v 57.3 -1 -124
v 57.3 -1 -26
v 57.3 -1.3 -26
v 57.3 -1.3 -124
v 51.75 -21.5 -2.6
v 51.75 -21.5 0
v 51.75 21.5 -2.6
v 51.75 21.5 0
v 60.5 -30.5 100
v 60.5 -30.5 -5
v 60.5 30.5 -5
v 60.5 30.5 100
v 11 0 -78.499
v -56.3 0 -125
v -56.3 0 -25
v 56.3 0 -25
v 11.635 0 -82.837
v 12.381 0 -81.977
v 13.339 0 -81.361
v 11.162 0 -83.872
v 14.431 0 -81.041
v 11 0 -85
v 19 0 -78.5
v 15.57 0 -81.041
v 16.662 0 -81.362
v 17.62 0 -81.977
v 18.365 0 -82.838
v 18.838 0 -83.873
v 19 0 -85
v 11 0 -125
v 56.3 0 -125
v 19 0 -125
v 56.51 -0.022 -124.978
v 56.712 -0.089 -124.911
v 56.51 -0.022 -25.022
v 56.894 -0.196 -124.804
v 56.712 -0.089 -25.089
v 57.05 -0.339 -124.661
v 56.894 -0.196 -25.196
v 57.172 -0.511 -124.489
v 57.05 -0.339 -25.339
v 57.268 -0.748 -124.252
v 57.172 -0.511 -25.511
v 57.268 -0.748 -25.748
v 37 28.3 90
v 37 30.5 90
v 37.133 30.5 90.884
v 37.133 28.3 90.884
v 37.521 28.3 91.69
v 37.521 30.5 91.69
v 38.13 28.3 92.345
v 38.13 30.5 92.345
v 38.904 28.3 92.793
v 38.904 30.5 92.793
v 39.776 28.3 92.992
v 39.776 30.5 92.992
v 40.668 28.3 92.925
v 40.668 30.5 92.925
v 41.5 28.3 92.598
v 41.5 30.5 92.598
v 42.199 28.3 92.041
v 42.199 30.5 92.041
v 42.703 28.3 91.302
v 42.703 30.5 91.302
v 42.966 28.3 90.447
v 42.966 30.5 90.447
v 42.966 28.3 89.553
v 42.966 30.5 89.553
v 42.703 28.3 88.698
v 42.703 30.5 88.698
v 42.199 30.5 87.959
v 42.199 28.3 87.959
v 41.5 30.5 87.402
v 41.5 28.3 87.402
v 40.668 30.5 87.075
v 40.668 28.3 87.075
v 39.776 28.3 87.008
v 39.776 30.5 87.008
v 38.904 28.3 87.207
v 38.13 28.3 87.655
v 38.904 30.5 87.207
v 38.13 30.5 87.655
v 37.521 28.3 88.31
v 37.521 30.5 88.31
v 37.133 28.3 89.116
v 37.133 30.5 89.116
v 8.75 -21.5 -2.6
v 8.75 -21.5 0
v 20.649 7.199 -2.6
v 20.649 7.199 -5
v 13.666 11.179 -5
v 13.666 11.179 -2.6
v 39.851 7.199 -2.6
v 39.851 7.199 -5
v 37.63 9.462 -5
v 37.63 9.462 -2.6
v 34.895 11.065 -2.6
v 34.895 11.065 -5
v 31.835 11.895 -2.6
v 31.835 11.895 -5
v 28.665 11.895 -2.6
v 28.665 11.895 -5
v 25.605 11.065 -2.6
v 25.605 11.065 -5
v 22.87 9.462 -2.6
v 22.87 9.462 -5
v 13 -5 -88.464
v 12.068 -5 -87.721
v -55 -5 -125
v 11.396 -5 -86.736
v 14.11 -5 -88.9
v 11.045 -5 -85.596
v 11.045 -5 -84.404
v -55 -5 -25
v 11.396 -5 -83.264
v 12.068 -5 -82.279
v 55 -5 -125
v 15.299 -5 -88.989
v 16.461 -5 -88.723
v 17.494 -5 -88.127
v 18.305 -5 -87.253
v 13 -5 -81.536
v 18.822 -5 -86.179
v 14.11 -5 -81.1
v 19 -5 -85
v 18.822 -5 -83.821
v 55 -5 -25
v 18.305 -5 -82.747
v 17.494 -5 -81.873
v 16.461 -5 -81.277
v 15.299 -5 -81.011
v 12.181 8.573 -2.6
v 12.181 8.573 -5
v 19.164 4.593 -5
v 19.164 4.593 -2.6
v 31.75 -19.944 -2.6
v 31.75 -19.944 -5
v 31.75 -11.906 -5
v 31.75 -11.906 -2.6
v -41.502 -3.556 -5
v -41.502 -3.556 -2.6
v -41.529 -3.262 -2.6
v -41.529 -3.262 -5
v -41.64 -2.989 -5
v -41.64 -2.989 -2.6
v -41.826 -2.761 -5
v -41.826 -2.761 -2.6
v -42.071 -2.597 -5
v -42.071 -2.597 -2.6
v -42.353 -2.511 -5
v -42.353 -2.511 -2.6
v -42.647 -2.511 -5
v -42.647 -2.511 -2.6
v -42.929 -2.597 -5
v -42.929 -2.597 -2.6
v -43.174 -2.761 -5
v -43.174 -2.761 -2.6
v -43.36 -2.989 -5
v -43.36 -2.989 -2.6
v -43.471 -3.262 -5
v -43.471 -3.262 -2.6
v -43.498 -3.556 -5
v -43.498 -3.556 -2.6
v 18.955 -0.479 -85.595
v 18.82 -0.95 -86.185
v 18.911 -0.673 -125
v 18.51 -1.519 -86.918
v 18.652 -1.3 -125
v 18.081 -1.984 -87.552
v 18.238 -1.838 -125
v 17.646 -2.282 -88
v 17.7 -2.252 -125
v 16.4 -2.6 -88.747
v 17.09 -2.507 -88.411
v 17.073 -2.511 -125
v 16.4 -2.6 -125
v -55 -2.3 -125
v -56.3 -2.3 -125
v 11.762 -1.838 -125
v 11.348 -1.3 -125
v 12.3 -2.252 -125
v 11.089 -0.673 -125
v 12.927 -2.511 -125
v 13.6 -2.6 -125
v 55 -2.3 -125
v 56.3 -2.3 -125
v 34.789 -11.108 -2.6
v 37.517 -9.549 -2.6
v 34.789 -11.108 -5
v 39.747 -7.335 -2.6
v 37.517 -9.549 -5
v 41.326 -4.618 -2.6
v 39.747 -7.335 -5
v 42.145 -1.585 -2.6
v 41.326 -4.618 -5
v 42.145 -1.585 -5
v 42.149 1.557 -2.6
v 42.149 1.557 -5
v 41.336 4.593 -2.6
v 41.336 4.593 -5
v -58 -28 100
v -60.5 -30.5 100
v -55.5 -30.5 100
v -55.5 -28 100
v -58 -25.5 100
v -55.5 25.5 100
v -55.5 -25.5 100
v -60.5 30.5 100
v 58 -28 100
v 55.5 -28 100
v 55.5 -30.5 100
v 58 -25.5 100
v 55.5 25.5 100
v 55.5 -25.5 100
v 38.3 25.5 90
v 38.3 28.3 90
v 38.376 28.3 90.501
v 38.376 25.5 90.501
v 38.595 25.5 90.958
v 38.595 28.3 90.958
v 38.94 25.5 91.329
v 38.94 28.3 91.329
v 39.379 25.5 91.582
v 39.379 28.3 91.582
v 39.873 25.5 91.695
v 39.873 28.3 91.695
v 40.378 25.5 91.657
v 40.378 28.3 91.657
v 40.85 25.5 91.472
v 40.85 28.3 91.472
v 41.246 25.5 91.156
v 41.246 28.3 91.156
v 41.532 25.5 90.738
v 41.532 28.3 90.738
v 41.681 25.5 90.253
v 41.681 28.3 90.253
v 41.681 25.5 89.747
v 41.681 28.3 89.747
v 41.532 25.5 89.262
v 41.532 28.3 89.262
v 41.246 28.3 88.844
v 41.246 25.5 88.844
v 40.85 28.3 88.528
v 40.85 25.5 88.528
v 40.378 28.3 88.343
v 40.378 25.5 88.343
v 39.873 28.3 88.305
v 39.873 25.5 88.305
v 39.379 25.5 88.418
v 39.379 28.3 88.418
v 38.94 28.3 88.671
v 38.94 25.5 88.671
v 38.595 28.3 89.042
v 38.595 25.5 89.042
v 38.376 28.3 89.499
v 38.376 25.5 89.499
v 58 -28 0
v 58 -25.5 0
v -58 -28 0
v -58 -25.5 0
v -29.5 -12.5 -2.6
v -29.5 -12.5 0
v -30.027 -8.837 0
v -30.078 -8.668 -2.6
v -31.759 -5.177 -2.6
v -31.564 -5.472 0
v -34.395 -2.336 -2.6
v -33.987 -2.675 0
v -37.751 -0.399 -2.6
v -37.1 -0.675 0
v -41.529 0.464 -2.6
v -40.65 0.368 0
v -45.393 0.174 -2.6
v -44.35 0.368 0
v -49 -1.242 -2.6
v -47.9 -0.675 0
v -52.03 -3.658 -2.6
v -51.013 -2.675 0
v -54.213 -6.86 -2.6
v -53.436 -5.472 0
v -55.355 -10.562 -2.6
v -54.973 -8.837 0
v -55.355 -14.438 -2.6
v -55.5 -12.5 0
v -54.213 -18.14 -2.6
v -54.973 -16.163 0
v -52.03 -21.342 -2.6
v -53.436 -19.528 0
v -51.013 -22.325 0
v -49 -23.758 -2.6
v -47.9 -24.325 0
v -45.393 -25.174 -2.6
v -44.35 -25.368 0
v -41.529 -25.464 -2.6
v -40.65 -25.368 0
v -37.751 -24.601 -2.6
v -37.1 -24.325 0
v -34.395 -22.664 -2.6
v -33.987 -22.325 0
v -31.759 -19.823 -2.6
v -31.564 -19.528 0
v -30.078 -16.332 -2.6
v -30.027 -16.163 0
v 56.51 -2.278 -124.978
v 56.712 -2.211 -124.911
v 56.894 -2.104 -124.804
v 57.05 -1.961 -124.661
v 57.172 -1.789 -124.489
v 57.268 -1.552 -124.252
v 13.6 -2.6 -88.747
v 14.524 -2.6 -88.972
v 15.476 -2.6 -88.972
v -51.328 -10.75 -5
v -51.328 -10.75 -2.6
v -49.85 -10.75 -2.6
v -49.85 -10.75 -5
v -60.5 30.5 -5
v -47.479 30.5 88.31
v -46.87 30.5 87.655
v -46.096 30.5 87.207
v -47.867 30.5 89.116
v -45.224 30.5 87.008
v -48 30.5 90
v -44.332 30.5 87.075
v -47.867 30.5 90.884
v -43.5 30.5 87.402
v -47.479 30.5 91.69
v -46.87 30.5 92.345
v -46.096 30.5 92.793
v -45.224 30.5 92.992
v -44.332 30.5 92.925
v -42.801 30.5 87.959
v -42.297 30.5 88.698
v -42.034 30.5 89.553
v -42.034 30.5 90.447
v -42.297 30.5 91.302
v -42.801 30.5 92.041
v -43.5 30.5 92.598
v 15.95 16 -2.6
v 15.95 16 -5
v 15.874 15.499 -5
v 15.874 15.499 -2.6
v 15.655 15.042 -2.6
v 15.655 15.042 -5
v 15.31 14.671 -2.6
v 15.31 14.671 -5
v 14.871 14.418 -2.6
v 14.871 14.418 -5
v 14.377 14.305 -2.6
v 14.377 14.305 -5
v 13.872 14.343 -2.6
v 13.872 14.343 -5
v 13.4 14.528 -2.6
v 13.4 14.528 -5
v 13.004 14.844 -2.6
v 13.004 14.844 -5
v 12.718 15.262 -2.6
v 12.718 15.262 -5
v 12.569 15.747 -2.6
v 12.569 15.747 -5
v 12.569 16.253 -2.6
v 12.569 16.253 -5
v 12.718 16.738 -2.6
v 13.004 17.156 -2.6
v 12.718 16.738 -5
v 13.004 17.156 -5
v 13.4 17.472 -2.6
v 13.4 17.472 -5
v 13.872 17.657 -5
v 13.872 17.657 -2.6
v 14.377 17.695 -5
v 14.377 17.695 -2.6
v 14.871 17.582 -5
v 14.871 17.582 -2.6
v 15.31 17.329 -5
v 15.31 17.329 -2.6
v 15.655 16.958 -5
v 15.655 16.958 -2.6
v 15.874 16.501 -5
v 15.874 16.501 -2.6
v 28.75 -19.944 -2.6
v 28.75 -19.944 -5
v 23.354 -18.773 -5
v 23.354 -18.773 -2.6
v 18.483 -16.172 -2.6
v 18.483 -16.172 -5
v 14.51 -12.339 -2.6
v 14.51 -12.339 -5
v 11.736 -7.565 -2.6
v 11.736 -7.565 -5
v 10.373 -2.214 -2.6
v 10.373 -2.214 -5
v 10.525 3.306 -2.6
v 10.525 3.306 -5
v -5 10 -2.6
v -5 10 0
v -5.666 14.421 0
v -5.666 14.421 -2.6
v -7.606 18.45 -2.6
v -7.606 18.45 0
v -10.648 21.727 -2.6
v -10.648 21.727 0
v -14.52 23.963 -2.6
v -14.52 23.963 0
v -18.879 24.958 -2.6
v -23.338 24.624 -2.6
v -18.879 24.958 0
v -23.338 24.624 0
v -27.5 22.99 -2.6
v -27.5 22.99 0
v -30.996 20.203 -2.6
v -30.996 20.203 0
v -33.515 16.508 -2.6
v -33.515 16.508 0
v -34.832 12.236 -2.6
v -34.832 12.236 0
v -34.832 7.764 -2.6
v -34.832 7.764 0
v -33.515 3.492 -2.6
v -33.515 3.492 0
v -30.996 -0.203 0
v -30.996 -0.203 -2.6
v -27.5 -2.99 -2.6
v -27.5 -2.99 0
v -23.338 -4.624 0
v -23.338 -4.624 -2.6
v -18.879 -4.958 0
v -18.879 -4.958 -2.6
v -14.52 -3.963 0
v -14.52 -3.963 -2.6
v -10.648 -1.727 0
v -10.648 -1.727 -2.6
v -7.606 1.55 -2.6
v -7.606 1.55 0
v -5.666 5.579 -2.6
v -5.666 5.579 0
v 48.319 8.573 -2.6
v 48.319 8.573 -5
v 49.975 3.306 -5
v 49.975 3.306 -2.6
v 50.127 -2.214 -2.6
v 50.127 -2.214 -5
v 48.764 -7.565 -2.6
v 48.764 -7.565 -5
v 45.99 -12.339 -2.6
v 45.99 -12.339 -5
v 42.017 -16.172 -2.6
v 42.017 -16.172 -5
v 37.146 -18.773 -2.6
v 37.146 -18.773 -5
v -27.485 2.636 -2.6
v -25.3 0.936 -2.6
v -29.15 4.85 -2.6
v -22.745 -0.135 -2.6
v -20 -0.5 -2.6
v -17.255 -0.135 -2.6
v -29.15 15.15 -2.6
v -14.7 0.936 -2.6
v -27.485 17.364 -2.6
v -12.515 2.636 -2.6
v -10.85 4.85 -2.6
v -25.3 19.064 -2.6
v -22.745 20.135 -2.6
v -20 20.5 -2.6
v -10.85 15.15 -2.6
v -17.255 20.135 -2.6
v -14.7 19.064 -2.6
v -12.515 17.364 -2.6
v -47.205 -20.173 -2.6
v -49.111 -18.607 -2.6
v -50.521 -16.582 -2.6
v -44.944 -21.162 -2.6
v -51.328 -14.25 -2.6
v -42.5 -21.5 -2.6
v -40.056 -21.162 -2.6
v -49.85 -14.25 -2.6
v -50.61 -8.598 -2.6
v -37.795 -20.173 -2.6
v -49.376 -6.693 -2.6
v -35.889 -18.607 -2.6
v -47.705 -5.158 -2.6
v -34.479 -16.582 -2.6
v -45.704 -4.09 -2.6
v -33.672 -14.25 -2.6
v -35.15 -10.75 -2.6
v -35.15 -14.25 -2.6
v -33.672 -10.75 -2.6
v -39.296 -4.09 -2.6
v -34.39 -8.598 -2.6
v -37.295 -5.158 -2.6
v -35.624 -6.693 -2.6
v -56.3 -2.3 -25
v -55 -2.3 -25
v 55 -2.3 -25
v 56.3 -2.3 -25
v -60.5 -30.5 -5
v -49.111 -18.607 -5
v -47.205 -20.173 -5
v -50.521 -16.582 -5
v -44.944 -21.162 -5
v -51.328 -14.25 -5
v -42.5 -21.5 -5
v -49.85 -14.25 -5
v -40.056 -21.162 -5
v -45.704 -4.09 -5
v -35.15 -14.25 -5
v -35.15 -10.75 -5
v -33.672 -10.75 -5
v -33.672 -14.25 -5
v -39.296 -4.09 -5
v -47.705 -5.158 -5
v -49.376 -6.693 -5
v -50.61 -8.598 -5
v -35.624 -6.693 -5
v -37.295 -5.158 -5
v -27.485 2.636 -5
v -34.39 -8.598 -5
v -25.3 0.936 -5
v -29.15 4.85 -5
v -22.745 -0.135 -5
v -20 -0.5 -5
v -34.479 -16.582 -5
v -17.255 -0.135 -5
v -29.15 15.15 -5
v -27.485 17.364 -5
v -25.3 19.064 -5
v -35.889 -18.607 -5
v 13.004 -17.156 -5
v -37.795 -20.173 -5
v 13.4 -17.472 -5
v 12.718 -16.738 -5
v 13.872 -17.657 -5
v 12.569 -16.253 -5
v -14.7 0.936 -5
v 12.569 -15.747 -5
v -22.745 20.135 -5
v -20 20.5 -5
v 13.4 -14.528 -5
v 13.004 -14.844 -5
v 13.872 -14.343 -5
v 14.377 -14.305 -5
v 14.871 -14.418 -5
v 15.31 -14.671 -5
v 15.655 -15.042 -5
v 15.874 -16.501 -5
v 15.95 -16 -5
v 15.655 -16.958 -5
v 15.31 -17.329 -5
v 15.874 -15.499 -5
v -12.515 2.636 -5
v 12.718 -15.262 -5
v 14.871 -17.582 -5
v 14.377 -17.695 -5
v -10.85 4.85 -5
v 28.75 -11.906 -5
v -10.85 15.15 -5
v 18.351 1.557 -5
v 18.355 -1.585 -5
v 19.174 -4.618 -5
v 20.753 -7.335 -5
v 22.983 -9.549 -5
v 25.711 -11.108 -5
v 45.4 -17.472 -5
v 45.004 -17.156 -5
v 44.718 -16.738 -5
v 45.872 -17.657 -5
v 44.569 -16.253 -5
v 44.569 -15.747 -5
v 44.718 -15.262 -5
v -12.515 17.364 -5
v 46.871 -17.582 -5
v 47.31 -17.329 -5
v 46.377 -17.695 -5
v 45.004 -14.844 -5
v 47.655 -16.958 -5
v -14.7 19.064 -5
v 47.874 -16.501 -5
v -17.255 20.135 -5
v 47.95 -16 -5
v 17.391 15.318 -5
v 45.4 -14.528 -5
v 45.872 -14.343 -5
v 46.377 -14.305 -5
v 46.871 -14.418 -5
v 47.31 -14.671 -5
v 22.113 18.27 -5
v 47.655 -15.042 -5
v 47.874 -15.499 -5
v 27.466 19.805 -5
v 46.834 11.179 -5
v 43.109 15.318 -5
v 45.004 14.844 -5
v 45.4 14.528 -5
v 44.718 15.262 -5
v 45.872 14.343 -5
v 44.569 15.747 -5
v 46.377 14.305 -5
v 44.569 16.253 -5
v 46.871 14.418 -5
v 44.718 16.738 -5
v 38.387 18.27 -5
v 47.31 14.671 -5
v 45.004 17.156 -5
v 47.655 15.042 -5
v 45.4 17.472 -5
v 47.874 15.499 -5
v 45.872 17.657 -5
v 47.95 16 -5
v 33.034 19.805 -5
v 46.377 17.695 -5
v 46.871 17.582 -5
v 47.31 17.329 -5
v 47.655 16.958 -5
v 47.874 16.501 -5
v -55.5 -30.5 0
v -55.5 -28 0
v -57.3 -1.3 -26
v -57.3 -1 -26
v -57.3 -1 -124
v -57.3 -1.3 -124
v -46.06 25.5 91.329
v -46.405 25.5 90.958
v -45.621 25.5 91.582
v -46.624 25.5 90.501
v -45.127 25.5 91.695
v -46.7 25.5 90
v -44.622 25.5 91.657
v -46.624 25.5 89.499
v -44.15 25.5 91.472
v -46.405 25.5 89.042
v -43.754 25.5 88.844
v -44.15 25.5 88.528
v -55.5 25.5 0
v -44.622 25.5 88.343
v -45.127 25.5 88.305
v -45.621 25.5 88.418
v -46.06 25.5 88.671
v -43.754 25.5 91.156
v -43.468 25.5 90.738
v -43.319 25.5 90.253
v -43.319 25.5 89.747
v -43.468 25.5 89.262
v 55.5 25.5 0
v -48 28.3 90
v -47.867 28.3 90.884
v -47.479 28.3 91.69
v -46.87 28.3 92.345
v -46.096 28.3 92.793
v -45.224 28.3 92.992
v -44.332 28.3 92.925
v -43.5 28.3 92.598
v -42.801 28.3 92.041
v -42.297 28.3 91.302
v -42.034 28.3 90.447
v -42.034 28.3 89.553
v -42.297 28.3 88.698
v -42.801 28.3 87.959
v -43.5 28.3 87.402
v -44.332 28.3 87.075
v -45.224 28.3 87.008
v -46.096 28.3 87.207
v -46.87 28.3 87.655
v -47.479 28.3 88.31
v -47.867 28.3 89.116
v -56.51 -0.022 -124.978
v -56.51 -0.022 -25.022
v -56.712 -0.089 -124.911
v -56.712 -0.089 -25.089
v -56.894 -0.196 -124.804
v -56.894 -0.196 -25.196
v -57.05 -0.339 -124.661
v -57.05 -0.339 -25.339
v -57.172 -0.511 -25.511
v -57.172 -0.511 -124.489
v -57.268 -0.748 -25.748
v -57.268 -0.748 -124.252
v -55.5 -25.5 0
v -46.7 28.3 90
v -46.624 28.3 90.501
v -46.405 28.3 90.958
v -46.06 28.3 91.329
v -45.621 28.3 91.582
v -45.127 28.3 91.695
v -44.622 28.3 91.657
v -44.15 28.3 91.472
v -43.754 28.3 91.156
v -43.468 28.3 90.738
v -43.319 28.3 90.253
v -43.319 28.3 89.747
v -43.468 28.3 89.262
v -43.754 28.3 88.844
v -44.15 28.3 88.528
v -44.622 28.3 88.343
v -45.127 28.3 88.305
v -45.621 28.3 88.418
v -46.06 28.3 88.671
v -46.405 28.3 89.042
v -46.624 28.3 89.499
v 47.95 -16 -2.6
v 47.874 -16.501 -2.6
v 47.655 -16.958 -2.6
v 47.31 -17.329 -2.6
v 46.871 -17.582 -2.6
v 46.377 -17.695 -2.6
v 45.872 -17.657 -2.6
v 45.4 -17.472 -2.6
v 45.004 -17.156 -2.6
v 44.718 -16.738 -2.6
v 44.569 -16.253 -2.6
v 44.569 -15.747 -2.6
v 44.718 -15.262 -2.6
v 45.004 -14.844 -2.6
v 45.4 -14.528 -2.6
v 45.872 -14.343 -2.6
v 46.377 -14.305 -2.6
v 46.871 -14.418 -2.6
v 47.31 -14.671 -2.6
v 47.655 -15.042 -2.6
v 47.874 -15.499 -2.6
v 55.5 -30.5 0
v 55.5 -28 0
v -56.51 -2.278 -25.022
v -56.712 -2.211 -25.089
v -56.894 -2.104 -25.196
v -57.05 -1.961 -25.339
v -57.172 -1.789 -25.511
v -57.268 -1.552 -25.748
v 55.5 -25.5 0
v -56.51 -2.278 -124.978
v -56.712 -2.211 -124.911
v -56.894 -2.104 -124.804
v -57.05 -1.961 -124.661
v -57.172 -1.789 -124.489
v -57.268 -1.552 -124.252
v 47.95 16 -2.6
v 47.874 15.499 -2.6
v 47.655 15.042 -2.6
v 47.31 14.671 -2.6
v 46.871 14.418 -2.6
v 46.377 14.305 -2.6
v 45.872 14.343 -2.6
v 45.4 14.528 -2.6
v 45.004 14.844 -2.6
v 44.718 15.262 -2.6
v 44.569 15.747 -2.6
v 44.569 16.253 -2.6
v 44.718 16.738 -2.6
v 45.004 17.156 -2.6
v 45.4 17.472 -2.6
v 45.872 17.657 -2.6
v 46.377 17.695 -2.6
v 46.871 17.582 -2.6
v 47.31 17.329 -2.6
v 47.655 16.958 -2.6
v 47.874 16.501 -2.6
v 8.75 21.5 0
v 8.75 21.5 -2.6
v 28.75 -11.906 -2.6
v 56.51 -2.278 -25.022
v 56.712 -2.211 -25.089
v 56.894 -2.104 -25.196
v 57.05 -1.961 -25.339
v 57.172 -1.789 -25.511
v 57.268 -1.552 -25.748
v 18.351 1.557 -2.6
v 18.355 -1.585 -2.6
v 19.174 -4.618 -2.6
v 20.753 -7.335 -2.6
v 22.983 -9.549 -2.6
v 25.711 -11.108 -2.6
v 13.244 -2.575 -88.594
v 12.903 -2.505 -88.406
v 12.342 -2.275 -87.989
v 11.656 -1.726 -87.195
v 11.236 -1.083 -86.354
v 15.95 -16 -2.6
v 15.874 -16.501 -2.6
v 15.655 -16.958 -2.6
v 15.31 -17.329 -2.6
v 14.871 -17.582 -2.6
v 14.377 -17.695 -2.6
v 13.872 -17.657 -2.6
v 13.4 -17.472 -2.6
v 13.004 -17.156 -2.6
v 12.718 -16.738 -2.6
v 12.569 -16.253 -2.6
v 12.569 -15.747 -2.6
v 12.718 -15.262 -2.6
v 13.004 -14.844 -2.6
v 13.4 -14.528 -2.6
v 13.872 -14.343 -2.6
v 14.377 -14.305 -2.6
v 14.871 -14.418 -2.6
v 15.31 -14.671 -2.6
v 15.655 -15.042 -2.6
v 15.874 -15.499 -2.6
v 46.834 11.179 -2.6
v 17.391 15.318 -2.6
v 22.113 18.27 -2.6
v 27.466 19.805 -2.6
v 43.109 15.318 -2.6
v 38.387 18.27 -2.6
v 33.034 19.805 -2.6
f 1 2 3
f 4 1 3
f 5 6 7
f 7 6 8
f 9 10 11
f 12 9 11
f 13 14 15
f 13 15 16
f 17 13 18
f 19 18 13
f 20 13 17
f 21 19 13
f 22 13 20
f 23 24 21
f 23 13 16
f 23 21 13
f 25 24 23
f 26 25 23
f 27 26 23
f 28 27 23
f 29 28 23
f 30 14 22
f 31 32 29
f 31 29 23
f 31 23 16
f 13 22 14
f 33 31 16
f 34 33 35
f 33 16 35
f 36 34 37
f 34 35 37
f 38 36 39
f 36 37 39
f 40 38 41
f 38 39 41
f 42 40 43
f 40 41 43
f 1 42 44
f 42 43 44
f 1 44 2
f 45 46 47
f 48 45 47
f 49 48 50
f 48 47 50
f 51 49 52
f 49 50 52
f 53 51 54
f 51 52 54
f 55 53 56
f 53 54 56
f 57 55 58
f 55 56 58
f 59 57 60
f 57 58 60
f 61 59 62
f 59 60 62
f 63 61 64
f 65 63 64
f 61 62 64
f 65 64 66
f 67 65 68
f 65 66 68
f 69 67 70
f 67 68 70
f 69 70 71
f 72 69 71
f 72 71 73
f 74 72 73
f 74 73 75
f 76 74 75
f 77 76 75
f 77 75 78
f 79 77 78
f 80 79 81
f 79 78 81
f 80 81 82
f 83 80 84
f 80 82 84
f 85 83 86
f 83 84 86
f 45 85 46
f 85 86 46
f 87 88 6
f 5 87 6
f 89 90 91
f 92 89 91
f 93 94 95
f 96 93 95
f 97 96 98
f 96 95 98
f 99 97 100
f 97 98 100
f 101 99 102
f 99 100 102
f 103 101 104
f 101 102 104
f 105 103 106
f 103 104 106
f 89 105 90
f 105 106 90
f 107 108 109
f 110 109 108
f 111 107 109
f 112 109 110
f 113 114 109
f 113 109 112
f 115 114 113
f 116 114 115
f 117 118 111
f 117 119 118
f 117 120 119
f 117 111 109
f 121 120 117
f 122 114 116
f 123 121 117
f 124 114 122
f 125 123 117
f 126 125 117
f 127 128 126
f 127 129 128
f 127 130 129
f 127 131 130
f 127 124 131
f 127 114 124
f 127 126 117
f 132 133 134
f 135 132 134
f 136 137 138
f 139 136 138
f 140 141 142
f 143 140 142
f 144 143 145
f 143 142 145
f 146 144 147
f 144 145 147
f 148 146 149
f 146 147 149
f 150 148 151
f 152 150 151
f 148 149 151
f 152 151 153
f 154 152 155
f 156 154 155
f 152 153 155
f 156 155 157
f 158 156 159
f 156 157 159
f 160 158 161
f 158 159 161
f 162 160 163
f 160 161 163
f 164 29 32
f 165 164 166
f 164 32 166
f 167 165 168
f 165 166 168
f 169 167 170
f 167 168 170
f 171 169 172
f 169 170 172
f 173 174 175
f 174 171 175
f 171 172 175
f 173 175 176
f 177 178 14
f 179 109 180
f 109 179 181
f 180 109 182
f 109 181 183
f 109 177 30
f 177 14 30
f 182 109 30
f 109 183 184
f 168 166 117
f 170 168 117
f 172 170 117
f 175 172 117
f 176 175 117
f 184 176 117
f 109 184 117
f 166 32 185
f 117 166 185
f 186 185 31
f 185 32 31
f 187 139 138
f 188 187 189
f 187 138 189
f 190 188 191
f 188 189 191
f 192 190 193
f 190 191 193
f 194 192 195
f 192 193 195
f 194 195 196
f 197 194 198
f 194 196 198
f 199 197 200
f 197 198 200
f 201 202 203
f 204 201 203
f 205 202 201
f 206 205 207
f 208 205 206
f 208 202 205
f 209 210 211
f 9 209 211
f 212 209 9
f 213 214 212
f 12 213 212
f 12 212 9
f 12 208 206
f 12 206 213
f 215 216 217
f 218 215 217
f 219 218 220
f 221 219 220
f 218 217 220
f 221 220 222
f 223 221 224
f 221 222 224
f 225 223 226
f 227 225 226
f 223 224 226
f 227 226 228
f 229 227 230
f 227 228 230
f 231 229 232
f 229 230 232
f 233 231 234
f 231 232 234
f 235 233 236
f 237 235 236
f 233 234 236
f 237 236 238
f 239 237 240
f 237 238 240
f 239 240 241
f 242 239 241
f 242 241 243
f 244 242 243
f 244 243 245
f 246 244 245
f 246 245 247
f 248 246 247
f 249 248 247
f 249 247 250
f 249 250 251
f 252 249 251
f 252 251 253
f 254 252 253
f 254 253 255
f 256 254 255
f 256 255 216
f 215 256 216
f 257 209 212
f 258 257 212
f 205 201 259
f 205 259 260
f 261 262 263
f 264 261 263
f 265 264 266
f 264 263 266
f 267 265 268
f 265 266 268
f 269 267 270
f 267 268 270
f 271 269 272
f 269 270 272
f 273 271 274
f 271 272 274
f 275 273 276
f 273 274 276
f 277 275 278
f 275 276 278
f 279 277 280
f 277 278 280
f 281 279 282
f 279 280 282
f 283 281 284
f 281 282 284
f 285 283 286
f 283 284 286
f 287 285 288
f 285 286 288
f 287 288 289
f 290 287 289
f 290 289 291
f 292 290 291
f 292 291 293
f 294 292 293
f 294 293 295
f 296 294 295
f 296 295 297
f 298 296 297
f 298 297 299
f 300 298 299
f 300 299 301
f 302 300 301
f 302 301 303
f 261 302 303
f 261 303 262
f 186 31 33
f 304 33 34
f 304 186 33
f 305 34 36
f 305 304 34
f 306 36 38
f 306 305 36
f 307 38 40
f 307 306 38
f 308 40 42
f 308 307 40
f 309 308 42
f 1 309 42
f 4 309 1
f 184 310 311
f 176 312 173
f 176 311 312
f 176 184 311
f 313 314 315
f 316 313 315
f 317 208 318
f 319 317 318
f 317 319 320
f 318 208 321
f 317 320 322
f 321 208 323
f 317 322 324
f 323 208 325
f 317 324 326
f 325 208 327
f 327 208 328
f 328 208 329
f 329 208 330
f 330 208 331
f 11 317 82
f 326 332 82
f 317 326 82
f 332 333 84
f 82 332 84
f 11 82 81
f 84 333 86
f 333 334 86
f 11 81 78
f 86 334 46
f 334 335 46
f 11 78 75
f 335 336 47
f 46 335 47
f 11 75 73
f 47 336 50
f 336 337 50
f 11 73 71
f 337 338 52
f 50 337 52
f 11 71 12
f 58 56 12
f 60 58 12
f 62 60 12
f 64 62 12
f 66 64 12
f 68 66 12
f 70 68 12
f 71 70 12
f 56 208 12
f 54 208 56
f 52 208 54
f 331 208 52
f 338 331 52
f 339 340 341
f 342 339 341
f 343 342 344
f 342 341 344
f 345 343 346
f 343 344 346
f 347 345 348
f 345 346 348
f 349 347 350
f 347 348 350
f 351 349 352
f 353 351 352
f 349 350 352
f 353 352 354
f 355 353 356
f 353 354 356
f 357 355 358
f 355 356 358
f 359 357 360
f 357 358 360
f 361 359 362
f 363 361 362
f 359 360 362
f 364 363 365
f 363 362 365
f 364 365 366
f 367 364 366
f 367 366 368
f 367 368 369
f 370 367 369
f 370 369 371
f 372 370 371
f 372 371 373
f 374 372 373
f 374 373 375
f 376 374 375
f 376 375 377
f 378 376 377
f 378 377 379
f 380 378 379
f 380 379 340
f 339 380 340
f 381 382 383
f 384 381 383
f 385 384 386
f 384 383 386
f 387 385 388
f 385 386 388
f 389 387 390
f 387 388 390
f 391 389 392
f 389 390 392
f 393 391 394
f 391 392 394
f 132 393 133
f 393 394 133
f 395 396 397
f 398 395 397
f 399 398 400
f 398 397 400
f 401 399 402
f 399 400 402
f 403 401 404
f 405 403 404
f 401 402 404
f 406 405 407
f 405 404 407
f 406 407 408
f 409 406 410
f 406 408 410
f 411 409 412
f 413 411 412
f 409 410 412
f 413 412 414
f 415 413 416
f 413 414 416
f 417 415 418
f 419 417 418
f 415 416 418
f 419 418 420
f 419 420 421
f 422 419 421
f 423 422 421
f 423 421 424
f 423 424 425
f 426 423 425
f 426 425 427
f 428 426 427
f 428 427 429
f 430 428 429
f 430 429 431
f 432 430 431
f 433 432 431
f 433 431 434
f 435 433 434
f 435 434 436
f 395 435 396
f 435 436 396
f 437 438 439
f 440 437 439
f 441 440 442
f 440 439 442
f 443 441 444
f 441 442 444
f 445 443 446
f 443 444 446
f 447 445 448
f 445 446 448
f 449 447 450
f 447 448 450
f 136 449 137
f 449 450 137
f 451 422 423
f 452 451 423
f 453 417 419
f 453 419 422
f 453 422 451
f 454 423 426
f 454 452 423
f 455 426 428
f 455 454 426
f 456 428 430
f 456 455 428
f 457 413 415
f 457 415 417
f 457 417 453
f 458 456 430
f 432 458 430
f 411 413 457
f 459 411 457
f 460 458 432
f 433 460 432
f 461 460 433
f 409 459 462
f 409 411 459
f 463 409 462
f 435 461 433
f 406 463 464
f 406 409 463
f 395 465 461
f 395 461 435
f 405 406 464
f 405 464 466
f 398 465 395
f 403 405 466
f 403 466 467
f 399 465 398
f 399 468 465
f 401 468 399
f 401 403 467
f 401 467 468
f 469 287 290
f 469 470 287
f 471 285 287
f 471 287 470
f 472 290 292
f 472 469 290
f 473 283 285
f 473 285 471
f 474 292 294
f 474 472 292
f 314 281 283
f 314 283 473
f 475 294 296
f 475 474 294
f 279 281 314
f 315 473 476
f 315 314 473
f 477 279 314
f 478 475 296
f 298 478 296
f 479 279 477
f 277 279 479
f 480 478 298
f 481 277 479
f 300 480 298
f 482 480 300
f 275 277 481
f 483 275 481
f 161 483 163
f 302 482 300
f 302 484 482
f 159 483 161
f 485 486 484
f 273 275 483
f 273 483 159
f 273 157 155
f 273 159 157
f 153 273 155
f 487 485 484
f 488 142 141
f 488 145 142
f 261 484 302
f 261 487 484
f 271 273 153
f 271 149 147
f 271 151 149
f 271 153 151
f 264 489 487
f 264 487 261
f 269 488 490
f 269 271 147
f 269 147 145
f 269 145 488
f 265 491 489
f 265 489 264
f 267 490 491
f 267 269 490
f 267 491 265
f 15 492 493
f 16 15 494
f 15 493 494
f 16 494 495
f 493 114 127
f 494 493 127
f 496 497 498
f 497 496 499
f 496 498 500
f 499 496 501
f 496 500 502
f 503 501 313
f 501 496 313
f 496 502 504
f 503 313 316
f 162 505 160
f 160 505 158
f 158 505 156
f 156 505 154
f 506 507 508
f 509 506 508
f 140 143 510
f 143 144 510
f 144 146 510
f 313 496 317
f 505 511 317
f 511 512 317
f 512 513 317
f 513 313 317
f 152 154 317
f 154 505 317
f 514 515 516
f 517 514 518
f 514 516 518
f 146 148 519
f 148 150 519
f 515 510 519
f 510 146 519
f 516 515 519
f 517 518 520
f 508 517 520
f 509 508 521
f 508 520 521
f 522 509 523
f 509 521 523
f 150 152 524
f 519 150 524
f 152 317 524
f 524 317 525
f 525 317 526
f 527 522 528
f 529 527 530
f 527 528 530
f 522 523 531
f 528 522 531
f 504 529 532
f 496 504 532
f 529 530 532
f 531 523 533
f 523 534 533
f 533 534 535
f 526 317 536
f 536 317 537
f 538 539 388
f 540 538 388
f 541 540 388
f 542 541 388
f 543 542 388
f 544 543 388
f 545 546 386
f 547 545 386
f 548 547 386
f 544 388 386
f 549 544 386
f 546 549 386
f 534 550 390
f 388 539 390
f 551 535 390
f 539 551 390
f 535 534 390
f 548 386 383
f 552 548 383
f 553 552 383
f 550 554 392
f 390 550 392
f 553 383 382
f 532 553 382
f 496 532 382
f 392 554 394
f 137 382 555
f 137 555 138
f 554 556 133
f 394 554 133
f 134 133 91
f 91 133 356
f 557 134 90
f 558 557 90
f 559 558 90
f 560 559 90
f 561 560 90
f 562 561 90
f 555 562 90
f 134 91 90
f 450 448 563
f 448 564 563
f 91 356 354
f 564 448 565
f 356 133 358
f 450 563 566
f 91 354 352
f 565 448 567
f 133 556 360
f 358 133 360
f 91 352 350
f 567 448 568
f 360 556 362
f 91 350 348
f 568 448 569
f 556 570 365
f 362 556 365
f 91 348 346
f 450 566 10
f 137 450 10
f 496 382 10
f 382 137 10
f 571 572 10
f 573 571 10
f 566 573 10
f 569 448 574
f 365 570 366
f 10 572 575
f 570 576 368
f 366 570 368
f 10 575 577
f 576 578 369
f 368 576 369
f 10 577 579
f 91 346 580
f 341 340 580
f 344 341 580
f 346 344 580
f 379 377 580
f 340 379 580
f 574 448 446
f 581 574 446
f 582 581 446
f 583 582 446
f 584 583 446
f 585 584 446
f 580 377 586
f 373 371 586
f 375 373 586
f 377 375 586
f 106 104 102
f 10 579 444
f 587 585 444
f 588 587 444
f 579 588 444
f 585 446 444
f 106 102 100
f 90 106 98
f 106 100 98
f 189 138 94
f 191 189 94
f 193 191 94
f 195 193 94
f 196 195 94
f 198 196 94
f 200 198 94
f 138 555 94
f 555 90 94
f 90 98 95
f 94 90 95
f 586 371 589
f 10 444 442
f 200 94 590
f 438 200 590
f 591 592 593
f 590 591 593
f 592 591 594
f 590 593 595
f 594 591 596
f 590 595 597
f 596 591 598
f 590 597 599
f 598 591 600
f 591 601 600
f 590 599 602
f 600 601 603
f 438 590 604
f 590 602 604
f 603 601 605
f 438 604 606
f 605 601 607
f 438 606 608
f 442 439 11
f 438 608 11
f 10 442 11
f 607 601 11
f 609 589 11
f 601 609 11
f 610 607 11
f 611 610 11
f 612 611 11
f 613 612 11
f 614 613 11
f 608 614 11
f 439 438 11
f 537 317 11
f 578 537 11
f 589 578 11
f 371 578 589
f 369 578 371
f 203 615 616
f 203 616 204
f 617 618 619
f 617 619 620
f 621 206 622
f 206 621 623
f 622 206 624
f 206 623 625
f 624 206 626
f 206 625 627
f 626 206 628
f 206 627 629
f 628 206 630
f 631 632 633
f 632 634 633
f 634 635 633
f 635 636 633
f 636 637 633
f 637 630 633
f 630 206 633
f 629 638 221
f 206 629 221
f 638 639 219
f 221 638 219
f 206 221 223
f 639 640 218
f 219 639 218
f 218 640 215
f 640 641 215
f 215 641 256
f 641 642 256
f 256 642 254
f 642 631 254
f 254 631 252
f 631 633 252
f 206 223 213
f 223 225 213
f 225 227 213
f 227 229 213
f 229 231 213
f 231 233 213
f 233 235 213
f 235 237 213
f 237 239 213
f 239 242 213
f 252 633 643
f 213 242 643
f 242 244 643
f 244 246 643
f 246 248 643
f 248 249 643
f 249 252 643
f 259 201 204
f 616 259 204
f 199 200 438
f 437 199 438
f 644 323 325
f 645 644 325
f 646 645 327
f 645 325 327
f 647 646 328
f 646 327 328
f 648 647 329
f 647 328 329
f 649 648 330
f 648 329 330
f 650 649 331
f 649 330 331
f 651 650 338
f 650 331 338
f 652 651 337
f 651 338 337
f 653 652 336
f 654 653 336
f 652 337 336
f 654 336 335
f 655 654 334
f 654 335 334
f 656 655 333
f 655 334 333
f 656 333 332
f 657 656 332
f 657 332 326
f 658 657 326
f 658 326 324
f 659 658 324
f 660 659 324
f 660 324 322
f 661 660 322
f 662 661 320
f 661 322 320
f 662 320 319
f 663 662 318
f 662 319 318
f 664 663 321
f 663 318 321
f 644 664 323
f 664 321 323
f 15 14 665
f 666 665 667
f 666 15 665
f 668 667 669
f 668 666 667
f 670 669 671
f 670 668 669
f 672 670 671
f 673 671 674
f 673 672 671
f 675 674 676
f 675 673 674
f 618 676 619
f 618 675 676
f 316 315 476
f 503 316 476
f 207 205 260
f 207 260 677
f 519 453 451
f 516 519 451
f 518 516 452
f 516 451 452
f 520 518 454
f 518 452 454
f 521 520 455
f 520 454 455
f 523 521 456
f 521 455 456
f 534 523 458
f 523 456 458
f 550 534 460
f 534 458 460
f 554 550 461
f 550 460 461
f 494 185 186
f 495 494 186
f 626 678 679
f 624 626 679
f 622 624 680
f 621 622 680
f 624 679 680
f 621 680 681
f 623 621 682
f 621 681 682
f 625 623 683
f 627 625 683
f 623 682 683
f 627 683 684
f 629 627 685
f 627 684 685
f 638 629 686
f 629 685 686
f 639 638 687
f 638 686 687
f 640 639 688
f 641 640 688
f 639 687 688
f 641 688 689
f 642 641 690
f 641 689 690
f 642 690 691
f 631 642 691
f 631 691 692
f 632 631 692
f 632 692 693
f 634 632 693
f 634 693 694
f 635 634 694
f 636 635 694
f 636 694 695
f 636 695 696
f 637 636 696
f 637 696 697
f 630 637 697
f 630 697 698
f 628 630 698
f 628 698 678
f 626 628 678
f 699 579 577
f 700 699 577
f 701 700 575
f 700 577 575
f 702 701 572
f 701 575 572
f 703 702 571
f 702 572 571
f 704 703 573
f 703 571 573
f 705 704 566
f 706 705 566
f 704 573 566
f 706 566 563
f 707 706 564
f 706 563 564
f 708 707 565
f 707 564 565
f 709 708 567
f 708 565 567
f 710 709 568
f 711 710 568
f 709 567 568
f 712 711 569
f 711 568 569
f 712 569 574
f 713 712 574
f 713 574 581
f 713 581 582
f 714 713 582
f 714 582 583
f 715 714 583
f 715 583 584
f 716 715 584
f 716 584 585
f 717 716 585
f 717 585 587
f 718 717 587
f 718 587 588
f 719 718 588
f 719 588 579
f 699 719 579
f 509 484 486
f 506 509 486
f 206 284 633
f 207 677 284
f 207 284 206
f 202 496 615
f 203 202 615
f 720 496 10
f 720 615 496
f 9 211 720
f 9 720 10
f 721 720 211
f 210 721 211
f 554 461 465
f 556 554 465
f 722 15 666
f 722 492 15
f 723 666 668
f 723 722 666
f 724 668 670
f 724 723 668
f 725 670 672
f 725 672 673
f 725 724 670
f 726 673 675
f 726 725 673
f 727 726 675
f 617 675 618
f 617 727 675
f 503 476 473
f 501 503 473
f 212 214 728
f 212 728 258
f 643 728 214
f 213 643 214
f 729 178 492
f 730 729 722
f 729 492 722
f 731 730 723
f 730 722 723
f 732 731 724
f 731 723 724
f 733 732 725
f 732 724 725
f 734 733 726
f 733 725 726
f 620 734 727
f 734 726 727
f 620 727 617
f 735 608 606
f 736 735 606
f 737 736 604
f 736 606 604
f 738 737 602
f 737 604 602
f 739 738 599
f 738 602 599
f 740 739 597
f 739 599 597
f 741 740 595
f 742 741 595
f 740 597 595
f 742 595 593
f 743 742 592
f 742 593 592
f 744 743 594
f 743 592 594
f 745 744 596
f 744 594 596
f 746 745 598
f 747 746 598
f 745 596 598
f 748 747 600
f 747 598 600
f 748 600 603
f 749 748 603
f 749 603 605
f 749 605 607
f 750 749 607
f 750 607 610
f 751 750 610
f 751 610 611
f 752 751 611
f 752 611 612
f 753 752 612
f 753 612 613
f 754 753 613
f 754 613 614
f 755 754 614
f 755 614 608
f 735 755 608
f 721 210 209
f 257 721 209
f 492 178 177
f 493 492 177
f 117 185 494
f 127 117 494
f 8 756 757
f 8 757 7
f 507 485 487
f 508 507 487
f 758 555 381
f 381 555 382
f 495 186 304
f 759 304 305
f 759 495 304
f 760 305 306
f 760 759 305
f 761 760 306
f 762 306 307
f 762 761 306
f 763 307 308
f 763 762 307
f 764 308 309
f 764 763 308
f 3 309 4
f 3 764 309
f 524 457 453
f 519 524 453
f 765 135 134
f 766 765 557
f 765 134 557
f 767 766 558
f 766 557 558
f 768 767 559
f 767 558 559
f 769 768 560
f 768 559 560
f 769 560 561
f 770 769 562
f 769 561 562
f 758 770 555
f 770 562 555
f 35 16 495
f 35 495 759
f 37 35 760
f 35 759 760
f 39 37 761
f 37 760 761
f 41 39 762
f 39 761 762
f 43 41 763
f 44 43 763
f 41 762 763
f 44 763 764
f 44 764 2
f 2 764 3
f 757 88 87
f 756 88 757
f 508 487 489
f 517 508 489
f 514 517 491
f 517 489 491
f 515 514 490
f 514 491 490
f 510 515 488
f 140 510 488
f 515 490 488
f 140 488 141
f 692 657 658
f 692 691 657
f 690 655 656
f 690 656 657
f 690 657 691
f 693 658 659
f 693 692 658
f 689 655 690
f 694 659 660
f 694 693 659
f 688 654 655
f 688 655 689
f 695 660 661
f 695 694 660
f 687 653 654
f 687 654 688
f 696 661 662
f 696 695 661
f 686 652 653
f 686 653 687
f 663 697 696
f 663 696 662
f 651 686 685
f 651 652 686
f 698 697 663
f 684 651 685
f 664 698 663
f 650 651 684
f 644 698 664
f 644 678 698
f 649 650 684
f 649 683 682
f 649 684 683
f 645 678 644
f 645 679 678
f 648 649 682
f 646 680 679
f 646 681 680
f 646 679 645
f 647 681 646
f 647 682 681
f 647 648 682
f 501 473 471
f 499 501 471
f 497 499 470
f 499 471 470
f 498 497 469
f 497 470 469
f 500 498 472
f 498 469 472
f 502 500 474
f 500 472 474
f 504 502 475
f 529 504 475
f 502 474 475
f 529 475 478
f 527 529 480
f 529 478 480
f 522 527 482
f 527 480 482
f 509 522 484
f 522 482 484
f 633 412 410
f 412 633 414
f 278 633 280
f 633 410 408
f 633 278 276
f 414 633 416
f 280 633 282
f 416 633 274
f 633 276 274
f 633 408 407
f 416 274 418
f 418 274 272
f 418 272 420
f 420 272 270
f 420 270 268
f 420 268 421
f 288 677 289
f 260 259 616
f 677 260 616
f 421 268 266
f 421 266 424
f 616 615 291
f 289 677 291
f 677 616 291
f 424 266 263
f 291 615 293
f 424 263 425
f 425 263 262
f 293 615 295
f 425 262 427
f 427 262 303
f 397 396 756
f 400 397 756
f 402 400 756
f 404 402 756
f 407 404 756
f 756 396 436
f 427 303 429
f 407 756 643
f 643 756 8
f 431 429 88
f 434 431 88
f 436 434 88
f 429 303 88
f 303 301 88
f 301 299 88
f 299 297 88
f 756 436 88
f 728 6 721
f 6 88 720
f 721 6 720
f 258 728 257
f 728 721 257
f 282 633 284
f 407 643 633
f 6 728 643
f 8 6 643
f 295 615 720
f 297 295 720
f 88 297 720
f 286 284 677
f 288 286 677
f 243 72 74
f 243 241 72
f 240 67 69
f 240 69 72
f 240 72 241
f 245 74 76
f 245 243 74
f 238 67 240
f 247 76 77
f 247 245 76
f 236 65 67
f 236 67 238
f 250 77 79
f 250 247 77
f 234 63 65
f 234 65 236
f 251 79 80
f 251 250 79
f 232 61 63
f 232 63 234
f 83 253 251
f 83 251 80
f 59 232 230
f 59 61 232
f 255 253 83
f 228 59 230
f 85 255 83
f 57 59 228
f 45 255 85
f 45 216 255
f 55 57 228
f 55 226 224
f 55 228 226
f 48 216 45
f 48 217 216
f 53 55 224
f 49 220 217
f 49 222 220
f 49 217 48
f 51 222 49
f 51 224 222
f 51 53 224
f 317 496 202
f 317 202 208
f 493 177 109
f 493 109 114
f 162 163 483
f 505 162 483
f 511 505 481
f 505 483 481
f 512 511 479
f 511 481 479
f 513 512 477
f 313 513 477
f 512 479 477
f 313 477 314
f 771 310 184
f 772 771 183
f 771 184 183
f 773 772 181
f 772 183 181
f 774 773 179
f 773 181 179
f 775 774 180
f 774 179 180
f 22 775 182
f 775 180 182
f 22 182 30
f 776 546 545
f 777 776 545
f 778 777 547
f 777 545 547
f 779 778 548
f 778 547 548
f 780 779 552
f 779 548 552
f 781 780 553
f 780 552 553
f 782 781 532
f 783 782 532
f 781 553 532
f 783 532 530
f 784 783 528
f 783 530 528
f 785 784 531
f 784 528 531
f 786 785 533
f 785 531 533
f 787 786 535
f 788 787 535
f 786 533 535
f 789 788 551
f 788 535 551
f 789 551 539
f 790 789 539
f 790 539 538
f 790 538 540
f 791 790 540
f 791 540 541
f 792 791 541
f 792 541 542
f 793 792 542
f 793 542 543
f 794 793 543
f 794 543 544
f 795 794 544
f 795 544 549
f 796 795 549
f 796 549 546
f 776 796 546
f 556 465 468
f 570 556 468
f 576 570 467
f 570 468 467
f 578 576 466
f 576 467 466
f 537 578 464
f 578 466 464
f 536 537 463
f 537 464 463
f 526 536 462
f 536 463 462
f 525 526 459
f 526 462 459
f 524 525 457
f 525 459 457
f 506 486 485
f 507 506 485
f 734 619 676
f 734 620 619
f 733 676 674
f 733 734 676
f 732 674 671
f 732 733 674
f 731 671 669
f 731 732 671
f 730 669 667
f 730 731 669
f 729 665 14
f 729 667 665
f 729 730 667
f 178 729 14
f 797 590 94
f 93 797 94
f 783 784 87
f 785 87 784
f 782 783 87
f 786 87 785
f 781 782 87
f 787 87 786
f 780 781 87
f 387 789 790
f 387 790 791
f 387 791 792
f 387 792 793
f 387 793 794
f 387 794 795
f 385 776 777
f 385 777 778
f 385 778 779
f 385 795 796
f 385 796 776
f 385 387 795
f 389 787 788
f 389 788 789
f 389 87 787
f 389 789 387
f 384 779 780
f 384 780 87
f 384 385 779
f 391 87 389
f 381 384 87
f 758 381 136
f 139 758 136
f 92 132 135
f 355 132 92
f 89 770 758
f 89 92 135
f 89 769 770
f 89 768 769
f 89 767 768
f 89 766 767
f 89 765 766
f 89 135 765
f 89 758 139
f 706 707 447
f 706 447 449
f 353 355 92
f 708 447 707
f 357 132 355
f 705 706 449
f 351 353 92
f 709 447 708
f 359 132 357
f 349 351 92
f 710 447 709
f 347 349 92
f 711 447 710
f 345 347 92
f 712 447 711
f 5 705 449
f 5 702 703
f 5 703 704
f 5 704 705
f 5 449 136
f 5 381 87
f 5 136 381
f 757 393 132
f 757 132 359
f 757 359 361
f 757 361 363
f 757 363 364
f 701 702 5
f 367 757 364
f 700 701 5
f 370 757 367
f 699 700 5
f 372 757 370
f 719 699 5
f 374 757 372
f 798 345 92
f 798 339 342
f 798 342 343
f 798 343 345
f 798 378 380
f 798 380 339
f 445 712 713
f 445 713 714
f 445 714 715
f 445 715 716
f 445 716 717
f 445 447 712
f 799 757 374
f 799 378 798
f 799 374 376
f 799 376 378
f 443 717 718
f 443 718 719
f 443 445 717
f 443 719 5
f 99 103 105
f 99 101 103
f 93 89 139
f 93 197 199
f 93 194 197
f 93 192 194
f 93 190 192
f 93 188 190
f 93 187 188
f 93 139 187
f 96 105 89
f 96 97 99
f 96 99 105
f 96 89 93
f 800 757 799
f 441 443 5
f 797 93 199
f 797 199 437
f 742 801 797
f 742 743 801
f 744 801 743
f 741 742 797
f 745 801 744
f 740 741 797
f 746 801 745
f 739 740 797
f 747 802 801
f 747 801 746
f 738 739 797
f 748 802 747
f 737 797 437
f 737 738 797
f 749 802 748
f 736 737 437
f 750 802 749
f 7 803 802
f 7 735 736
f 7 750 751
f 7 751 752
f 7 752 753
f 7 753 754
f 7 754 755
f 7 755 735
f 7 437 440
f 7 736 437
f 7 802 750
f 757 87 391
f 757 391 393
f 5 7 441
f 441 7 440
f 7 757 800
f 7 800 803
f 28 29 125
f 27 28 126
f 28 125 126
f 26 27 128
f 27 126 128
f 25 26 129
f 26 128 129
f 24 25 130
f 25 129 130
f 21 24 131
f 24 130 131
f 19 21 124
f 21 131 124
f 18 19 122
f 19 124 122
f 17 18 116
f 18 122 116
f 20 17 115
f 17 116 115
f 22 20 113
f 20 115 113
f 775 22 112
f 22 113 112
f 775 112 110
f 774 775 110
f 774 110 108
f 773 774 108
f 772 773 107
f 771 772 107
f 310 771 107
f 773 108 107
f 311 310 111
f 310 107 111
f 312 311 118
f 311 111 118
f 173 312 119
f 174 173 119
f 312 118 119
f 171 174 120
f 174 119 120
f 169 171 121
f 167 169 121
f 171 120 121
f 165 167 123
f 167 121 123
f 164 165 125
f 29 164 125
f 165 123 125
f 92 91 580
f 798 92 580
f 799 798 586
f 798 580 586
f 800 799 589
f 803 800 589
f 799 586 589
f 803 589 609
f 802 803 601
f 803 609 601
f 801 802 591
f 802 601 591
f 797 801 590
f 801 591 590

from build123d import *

# Parameters (mm, degrees)
F0_W          = 121
F0_H          = 61
F0_W_2        = 111
F0_H_2        = 51
F1_DEPTH      = 100
F2_W          = 121
F2_H          = 61
F3_DEPTH      = 5
F5_DEPTH      = 25
F7_R          = 1.7
F8_DEPTH      = 25
F10_R         = 1.7
F11_DEPTH     = 25
F12_R         = 3
F13_DEPTH     = 2.2
F14_R         = 15
F14_R_2       = 13
F14_W         = 43
F14_H         = 43
F15_DEPTH     = 2.6
F17_W         = 111
F17_H         = 100
F18_DEPTH     = 25
F20_W         = 2.5
F20_H         = 2.5
F21_DEPTH     = 100
F22_W         = 110
F22_H         = 100
F22_R         = 4
F23_DEPTH     = 5
F24_W         = 2.3
F24_H         = 2.3
F25_DEPTH     = 100
F26_R         = 1
F28_W         = 8
F28_H         = 2.6
F29_DEPTH     = 40.001
F30_T4_DEPTH  = 46.5
F30_S5_R      = 4
F30_T6_DEPTH  = 25
F30_T10_DEPTH = 46.501
F30_S11_R     = 4
F30_T12_DEPTH = 25


# Not quite as in the source:
# - a fillet or chamfer that OpenCascade refuses, or shapes differently, is made with other operations: its cross-section is extruded or revolved along the edge and cut away or added


with BuildPart() as f1:
    # F0 (on Top) → F1 (new body)
    with BuildSketch(Plane.XY):
        Rectangle(F0_W, F0_H)
        Rectangle(F0_W_2, F0_H_2, mode=Mode.SUBTRACT)
    extrude(amount=F1_DEPTH)

    # F2 (on Top) → F3 (join)
    with BuildSketch(Plane.XY):
        Rectangle(F2_W, F2_H)
    extrude(amount=-F3_DEPTH)

    # F4 (on Top) → F5 (cut)
    with BuildSketch(Plane.XY):
        with BuildLine():
            Line((-35.15, -10.75), (-33.6717782085, -10.75))
            ThreePointArc((-33.6717782085, -10.75), (-36.410590764, -5.8728516572), (-41.5015444025, -3.5555555556))
            ThreePointArc((-41.5015444025, -3.5555555556), (-42.5, -2.5), (-43.4984555975, -3.5555555556))
            ThreePointArc((-43.4984555975, -3.5555555556), (-48.589409236, -5.8728516572), (-51.3282217915, -10.75))
            Line((-51.3282217915, -10.75), (-49.85, -10.75))
            Line((-49.85, -10.75), (-49.85, -14.25))
            Line((-49.85, -14.25), (-51.3282217915, -14.25))
            ThreePointArc((-51.3282217915, -14.25), (-42.5, -21.5), (-33.6717782085, -14.25))
            Line((-33.6717782085, -14.25), (-35.15, -14.25))
            Line((-35.15, -14.25), (-35.15, -10.75))
        make_face()
        with BuildLine():
            Line((-29.15, 15.150485414), (-29.15, 4.849514586))
            ThreePointArc((-29.15, 4.849514586), (-20, -0.5), (-10.85, 4.849514586))
            Line((-10.85, 4.849514586), (-10.85, 15.150485414))
            ThreePointArc((-10.85, 15.150485414), (-20, 20.5), (-29.15, 15.150485414))
        make_face()
    extrude(amount=-F5_DEPTH, mode=Mode.SUBTRACT)

    # F7 (on offset) → F8 (cut)
    with BuildSketch(Plane(origin=(0, 30.5, 0), x_dir=(-1, 0, 0), z_dir=(0, 1, 0))):
        with Locations((-40, 90)):
            Circle(F7_R)
        with Locations((45, 90)):
            Circle(F7_R)
    extrude(amount=-F8_DEPTH, mode=Mode.SUBTRACT)

    # F10 (on offset) → F11 (cut)
    with BuildSketch(Plane(origin=(0, 0, -5), x_dir=(1, 0, 0), z_dir=(0, 0, -1))):
        with Locations((14.25, 16)):
            Circle(F10_R)
        with BuildLine():
            Line((28.75, 11.9058808998), (28.75, 19.9436706752))
            ThreePointArc((28.75, 19.9436706752), (12.9572093402, 10.0478550546), (12.1805876672, -8.5730005218))
            Line((12.1805876672, -8.5730005218), (19.1636367266, -4.5926625579))
            ThreePointArc((19.1636367266, -4.5926625579), (19.8743256041, 6.0287130328), (28.75, 11.9058808998))
        make_face()
        with BuildLine():
            Line((31.75, 19.9436706752), (31.75, 11.9058808998))
            ThreePointArc((31.75, 11.9058808998), (40.6256743959, 6.0287130328), (41.3363632734, -4.5926625579))
            Line((41.3363632734, -4.5926625579), (48.3194123328, -8.5730005218))
            ThreePointArc((48.3194123328, -8.5730005218), (47.5427906598, 10.0478550546), (31.75, 19.9436706752))
        make_face()
        with Locations((46.25, 16)):
            Circle(F10_R)
        with BuildLine():
            Line((46.8338032008, -11.1793323324), (39.8507541413, -7.1989943685))
            ThreePointArc((39.8507541413, -7.1989943685), (30.25, -12), (20.6492458587, -7.1989943685))
            Line((20.6492458587, -7.1989943685), (13.6661967992, -11.1793323324))
            ThreePointArc((13.6661967992, -11.1793323324), (30.25, -20), (46.8338032008, -11.1793323324))
        make_face()
        with Locations((14.25, -16)):
            Circle(F10_R)
        with Locations((46.25, -16)):
            Circle(F10_R)
    extrude(amount=-F11_DEPTH, mode=Mode.SUBTRACT)

    # F12 (on offset) → F13 (cut)
    with BuildSketch(Plane(origin=(0, 30.5, 0), x_dir=(-1, 0, 0), z_dir=(0, 1, 0))):
        with Locations((-40, 90)):
            Circle(F12_R)
        with Locations((45, 90)):
            Circle(F12_R)
    extrude(amount=-F13_DEPTH, mode=Mode.SUBTRACT)

    # F14 (on Top) → F15 (cut)
    with BuildSketch(Plane.XY):
        with Locations((-20, 10)):
            Circle(F14_R)
        with Locations((-42.5, -12.5)):
            Circle(F14_R_2)
        with Locations((30.25, 0)):
            Rectangle(F14_W, F14_H)
    extrude(amount=-F15_DEPTH, mode=Mode.SUBTRACT)

    # F17 (on offset) → F18 (cut)
    with BuildSketch(Plane.XZ.offset(30.5)):
        with Locations((0, 50)):
            Rectangle(F17_W, F17_H)
    extrude(amount=-F18_DEPTH, mode=Mode.SUBTRACT)

    # F20 (on offset) → F21 (cut)
    with BuildSketch(Plane.XY.offset(100)):
        with Locations((-56.75, -26.75)):
            Rectangle(F20_W, F20_H)
        with Locations((56.75, -26.75)):
            Rectangle(F20_W, F20_H)
    extrude(amount=-F21_DEPTH, mode=Mode.SUBTRACT)


with BuildPart() as f23:
    # F22 (on Front) → F23 (new body)
    with BuildSketch(Plane.XZ):
        with Locations((0, -75)):
            Rectangle(F22_W, F22_H)
        with Locations((15, -85)):
            Circle(F22_R, mode=Mode.SUBTRACT)
    extrude(amount=F23_DEPTH)

    # F24 (on face) → F25 (join)
    with BuildSketch(Plane(origin=(0, 0, -125), x_dir=(1, 0, 0), z_dir=(0, 0, -1))):
        with Locations((56.15, 1.15)):
            Rectangle(F24_W, F24_H)
        with Locations((-56.15, 1.15)):
            Rectangle(F24_W, F24_H)
    extrude(amount=-F25_DEPTH)

    # F26
    f26_edges = [f23.edges().sort_by_distance(p)[0] for p in [
        (57.3, 0, -75),
        (57.3, -2.3, -75),
        (57.3, -1.15, -125),
        (57.3, -1.15, -25),
        (-57.3, -2.3, -75),
        (-57.3, 0, -75),
        (-57.3, -1.15, -125),
        (-57.3, -1.15, -25),
    ]]
    fillet(f26_edges, radius=F26_R)

    # F28 (on offset) → F29 (cut, through all)
    with BuildSketch(Plane(origin=(0, 0, -125), x_dir=(1, 0, 0), z_dir=(0, 0, -1))):
        with Locations((15, 1.3)):
            Rectangle(F28_W, F28_H)
    extrude(amount=-F29_DEPTH, mode=Mode.SUBTRACT)

    # F30: fillet of radius 2.6 on 2 edges, made by hand


with BuildPart() as f30_tool2:
    # F30_s3 → F30_t4 (new body)
    with BuildSketch(Plane.XY.offset(-125)):
        with BuildLine():
            ThreePointArc((19, 0), (18.2384776311, -1.8384776311), (16.4, -2.6))
            Line((16.4, -2.6), (19, -2.6))
            Line((19, -2.6), (19, 0))
        make_face()
    extrude(amount=F30_T4_DEPTH)

    # F30_s5 → F30_t6 (cut, symmetric)
    with BuildSketch(Plane.XZ.offset(1.3)):
        with Locations((15, -85)):
            Circle(F30_S5_R)
    extrude(amount=F30_T6_DEPTH, both=True, mode=Mode.SUBTRACT)


with BuildPart() as f23_1:
    add(f23.part)

    # F30_t1: union F30_tool2
    add(f30_tool2.part)


with BuildPart() as f30_tool8:
    # F30_s9 → F30_t10 (new body)
    with BuildSketch(Plane.XY.offset(-125)):
        with BuildLine():
            ThreePointArc((13.6, -2.6), (11.7615223689, -1.8384776311), (11, 0))
            Line((11, 0), (11, -2.6))
            Line((11, -2.6), (13.6, -2.6))
        make_face()
    extrude(amount=F30_T10_DEPTH)

    # F30_s11 → F30_t12 (cut, symmetric)
    with BuildSketch(Plane.XZ.offset(1.3)):
        with Locations((15, -85)):
            Circle(F30_S11_R)
    extrude(amount=F30_T12_DEPTH, both=True, mode=Mode.SUBTRACT)


with BuildPart() as f23_2:
    add(f23_1.part)

    # F30_t7: union F30_tool8
    add(f30_tool8.part)


solid = Compound([f1.part, f23_2.part])
